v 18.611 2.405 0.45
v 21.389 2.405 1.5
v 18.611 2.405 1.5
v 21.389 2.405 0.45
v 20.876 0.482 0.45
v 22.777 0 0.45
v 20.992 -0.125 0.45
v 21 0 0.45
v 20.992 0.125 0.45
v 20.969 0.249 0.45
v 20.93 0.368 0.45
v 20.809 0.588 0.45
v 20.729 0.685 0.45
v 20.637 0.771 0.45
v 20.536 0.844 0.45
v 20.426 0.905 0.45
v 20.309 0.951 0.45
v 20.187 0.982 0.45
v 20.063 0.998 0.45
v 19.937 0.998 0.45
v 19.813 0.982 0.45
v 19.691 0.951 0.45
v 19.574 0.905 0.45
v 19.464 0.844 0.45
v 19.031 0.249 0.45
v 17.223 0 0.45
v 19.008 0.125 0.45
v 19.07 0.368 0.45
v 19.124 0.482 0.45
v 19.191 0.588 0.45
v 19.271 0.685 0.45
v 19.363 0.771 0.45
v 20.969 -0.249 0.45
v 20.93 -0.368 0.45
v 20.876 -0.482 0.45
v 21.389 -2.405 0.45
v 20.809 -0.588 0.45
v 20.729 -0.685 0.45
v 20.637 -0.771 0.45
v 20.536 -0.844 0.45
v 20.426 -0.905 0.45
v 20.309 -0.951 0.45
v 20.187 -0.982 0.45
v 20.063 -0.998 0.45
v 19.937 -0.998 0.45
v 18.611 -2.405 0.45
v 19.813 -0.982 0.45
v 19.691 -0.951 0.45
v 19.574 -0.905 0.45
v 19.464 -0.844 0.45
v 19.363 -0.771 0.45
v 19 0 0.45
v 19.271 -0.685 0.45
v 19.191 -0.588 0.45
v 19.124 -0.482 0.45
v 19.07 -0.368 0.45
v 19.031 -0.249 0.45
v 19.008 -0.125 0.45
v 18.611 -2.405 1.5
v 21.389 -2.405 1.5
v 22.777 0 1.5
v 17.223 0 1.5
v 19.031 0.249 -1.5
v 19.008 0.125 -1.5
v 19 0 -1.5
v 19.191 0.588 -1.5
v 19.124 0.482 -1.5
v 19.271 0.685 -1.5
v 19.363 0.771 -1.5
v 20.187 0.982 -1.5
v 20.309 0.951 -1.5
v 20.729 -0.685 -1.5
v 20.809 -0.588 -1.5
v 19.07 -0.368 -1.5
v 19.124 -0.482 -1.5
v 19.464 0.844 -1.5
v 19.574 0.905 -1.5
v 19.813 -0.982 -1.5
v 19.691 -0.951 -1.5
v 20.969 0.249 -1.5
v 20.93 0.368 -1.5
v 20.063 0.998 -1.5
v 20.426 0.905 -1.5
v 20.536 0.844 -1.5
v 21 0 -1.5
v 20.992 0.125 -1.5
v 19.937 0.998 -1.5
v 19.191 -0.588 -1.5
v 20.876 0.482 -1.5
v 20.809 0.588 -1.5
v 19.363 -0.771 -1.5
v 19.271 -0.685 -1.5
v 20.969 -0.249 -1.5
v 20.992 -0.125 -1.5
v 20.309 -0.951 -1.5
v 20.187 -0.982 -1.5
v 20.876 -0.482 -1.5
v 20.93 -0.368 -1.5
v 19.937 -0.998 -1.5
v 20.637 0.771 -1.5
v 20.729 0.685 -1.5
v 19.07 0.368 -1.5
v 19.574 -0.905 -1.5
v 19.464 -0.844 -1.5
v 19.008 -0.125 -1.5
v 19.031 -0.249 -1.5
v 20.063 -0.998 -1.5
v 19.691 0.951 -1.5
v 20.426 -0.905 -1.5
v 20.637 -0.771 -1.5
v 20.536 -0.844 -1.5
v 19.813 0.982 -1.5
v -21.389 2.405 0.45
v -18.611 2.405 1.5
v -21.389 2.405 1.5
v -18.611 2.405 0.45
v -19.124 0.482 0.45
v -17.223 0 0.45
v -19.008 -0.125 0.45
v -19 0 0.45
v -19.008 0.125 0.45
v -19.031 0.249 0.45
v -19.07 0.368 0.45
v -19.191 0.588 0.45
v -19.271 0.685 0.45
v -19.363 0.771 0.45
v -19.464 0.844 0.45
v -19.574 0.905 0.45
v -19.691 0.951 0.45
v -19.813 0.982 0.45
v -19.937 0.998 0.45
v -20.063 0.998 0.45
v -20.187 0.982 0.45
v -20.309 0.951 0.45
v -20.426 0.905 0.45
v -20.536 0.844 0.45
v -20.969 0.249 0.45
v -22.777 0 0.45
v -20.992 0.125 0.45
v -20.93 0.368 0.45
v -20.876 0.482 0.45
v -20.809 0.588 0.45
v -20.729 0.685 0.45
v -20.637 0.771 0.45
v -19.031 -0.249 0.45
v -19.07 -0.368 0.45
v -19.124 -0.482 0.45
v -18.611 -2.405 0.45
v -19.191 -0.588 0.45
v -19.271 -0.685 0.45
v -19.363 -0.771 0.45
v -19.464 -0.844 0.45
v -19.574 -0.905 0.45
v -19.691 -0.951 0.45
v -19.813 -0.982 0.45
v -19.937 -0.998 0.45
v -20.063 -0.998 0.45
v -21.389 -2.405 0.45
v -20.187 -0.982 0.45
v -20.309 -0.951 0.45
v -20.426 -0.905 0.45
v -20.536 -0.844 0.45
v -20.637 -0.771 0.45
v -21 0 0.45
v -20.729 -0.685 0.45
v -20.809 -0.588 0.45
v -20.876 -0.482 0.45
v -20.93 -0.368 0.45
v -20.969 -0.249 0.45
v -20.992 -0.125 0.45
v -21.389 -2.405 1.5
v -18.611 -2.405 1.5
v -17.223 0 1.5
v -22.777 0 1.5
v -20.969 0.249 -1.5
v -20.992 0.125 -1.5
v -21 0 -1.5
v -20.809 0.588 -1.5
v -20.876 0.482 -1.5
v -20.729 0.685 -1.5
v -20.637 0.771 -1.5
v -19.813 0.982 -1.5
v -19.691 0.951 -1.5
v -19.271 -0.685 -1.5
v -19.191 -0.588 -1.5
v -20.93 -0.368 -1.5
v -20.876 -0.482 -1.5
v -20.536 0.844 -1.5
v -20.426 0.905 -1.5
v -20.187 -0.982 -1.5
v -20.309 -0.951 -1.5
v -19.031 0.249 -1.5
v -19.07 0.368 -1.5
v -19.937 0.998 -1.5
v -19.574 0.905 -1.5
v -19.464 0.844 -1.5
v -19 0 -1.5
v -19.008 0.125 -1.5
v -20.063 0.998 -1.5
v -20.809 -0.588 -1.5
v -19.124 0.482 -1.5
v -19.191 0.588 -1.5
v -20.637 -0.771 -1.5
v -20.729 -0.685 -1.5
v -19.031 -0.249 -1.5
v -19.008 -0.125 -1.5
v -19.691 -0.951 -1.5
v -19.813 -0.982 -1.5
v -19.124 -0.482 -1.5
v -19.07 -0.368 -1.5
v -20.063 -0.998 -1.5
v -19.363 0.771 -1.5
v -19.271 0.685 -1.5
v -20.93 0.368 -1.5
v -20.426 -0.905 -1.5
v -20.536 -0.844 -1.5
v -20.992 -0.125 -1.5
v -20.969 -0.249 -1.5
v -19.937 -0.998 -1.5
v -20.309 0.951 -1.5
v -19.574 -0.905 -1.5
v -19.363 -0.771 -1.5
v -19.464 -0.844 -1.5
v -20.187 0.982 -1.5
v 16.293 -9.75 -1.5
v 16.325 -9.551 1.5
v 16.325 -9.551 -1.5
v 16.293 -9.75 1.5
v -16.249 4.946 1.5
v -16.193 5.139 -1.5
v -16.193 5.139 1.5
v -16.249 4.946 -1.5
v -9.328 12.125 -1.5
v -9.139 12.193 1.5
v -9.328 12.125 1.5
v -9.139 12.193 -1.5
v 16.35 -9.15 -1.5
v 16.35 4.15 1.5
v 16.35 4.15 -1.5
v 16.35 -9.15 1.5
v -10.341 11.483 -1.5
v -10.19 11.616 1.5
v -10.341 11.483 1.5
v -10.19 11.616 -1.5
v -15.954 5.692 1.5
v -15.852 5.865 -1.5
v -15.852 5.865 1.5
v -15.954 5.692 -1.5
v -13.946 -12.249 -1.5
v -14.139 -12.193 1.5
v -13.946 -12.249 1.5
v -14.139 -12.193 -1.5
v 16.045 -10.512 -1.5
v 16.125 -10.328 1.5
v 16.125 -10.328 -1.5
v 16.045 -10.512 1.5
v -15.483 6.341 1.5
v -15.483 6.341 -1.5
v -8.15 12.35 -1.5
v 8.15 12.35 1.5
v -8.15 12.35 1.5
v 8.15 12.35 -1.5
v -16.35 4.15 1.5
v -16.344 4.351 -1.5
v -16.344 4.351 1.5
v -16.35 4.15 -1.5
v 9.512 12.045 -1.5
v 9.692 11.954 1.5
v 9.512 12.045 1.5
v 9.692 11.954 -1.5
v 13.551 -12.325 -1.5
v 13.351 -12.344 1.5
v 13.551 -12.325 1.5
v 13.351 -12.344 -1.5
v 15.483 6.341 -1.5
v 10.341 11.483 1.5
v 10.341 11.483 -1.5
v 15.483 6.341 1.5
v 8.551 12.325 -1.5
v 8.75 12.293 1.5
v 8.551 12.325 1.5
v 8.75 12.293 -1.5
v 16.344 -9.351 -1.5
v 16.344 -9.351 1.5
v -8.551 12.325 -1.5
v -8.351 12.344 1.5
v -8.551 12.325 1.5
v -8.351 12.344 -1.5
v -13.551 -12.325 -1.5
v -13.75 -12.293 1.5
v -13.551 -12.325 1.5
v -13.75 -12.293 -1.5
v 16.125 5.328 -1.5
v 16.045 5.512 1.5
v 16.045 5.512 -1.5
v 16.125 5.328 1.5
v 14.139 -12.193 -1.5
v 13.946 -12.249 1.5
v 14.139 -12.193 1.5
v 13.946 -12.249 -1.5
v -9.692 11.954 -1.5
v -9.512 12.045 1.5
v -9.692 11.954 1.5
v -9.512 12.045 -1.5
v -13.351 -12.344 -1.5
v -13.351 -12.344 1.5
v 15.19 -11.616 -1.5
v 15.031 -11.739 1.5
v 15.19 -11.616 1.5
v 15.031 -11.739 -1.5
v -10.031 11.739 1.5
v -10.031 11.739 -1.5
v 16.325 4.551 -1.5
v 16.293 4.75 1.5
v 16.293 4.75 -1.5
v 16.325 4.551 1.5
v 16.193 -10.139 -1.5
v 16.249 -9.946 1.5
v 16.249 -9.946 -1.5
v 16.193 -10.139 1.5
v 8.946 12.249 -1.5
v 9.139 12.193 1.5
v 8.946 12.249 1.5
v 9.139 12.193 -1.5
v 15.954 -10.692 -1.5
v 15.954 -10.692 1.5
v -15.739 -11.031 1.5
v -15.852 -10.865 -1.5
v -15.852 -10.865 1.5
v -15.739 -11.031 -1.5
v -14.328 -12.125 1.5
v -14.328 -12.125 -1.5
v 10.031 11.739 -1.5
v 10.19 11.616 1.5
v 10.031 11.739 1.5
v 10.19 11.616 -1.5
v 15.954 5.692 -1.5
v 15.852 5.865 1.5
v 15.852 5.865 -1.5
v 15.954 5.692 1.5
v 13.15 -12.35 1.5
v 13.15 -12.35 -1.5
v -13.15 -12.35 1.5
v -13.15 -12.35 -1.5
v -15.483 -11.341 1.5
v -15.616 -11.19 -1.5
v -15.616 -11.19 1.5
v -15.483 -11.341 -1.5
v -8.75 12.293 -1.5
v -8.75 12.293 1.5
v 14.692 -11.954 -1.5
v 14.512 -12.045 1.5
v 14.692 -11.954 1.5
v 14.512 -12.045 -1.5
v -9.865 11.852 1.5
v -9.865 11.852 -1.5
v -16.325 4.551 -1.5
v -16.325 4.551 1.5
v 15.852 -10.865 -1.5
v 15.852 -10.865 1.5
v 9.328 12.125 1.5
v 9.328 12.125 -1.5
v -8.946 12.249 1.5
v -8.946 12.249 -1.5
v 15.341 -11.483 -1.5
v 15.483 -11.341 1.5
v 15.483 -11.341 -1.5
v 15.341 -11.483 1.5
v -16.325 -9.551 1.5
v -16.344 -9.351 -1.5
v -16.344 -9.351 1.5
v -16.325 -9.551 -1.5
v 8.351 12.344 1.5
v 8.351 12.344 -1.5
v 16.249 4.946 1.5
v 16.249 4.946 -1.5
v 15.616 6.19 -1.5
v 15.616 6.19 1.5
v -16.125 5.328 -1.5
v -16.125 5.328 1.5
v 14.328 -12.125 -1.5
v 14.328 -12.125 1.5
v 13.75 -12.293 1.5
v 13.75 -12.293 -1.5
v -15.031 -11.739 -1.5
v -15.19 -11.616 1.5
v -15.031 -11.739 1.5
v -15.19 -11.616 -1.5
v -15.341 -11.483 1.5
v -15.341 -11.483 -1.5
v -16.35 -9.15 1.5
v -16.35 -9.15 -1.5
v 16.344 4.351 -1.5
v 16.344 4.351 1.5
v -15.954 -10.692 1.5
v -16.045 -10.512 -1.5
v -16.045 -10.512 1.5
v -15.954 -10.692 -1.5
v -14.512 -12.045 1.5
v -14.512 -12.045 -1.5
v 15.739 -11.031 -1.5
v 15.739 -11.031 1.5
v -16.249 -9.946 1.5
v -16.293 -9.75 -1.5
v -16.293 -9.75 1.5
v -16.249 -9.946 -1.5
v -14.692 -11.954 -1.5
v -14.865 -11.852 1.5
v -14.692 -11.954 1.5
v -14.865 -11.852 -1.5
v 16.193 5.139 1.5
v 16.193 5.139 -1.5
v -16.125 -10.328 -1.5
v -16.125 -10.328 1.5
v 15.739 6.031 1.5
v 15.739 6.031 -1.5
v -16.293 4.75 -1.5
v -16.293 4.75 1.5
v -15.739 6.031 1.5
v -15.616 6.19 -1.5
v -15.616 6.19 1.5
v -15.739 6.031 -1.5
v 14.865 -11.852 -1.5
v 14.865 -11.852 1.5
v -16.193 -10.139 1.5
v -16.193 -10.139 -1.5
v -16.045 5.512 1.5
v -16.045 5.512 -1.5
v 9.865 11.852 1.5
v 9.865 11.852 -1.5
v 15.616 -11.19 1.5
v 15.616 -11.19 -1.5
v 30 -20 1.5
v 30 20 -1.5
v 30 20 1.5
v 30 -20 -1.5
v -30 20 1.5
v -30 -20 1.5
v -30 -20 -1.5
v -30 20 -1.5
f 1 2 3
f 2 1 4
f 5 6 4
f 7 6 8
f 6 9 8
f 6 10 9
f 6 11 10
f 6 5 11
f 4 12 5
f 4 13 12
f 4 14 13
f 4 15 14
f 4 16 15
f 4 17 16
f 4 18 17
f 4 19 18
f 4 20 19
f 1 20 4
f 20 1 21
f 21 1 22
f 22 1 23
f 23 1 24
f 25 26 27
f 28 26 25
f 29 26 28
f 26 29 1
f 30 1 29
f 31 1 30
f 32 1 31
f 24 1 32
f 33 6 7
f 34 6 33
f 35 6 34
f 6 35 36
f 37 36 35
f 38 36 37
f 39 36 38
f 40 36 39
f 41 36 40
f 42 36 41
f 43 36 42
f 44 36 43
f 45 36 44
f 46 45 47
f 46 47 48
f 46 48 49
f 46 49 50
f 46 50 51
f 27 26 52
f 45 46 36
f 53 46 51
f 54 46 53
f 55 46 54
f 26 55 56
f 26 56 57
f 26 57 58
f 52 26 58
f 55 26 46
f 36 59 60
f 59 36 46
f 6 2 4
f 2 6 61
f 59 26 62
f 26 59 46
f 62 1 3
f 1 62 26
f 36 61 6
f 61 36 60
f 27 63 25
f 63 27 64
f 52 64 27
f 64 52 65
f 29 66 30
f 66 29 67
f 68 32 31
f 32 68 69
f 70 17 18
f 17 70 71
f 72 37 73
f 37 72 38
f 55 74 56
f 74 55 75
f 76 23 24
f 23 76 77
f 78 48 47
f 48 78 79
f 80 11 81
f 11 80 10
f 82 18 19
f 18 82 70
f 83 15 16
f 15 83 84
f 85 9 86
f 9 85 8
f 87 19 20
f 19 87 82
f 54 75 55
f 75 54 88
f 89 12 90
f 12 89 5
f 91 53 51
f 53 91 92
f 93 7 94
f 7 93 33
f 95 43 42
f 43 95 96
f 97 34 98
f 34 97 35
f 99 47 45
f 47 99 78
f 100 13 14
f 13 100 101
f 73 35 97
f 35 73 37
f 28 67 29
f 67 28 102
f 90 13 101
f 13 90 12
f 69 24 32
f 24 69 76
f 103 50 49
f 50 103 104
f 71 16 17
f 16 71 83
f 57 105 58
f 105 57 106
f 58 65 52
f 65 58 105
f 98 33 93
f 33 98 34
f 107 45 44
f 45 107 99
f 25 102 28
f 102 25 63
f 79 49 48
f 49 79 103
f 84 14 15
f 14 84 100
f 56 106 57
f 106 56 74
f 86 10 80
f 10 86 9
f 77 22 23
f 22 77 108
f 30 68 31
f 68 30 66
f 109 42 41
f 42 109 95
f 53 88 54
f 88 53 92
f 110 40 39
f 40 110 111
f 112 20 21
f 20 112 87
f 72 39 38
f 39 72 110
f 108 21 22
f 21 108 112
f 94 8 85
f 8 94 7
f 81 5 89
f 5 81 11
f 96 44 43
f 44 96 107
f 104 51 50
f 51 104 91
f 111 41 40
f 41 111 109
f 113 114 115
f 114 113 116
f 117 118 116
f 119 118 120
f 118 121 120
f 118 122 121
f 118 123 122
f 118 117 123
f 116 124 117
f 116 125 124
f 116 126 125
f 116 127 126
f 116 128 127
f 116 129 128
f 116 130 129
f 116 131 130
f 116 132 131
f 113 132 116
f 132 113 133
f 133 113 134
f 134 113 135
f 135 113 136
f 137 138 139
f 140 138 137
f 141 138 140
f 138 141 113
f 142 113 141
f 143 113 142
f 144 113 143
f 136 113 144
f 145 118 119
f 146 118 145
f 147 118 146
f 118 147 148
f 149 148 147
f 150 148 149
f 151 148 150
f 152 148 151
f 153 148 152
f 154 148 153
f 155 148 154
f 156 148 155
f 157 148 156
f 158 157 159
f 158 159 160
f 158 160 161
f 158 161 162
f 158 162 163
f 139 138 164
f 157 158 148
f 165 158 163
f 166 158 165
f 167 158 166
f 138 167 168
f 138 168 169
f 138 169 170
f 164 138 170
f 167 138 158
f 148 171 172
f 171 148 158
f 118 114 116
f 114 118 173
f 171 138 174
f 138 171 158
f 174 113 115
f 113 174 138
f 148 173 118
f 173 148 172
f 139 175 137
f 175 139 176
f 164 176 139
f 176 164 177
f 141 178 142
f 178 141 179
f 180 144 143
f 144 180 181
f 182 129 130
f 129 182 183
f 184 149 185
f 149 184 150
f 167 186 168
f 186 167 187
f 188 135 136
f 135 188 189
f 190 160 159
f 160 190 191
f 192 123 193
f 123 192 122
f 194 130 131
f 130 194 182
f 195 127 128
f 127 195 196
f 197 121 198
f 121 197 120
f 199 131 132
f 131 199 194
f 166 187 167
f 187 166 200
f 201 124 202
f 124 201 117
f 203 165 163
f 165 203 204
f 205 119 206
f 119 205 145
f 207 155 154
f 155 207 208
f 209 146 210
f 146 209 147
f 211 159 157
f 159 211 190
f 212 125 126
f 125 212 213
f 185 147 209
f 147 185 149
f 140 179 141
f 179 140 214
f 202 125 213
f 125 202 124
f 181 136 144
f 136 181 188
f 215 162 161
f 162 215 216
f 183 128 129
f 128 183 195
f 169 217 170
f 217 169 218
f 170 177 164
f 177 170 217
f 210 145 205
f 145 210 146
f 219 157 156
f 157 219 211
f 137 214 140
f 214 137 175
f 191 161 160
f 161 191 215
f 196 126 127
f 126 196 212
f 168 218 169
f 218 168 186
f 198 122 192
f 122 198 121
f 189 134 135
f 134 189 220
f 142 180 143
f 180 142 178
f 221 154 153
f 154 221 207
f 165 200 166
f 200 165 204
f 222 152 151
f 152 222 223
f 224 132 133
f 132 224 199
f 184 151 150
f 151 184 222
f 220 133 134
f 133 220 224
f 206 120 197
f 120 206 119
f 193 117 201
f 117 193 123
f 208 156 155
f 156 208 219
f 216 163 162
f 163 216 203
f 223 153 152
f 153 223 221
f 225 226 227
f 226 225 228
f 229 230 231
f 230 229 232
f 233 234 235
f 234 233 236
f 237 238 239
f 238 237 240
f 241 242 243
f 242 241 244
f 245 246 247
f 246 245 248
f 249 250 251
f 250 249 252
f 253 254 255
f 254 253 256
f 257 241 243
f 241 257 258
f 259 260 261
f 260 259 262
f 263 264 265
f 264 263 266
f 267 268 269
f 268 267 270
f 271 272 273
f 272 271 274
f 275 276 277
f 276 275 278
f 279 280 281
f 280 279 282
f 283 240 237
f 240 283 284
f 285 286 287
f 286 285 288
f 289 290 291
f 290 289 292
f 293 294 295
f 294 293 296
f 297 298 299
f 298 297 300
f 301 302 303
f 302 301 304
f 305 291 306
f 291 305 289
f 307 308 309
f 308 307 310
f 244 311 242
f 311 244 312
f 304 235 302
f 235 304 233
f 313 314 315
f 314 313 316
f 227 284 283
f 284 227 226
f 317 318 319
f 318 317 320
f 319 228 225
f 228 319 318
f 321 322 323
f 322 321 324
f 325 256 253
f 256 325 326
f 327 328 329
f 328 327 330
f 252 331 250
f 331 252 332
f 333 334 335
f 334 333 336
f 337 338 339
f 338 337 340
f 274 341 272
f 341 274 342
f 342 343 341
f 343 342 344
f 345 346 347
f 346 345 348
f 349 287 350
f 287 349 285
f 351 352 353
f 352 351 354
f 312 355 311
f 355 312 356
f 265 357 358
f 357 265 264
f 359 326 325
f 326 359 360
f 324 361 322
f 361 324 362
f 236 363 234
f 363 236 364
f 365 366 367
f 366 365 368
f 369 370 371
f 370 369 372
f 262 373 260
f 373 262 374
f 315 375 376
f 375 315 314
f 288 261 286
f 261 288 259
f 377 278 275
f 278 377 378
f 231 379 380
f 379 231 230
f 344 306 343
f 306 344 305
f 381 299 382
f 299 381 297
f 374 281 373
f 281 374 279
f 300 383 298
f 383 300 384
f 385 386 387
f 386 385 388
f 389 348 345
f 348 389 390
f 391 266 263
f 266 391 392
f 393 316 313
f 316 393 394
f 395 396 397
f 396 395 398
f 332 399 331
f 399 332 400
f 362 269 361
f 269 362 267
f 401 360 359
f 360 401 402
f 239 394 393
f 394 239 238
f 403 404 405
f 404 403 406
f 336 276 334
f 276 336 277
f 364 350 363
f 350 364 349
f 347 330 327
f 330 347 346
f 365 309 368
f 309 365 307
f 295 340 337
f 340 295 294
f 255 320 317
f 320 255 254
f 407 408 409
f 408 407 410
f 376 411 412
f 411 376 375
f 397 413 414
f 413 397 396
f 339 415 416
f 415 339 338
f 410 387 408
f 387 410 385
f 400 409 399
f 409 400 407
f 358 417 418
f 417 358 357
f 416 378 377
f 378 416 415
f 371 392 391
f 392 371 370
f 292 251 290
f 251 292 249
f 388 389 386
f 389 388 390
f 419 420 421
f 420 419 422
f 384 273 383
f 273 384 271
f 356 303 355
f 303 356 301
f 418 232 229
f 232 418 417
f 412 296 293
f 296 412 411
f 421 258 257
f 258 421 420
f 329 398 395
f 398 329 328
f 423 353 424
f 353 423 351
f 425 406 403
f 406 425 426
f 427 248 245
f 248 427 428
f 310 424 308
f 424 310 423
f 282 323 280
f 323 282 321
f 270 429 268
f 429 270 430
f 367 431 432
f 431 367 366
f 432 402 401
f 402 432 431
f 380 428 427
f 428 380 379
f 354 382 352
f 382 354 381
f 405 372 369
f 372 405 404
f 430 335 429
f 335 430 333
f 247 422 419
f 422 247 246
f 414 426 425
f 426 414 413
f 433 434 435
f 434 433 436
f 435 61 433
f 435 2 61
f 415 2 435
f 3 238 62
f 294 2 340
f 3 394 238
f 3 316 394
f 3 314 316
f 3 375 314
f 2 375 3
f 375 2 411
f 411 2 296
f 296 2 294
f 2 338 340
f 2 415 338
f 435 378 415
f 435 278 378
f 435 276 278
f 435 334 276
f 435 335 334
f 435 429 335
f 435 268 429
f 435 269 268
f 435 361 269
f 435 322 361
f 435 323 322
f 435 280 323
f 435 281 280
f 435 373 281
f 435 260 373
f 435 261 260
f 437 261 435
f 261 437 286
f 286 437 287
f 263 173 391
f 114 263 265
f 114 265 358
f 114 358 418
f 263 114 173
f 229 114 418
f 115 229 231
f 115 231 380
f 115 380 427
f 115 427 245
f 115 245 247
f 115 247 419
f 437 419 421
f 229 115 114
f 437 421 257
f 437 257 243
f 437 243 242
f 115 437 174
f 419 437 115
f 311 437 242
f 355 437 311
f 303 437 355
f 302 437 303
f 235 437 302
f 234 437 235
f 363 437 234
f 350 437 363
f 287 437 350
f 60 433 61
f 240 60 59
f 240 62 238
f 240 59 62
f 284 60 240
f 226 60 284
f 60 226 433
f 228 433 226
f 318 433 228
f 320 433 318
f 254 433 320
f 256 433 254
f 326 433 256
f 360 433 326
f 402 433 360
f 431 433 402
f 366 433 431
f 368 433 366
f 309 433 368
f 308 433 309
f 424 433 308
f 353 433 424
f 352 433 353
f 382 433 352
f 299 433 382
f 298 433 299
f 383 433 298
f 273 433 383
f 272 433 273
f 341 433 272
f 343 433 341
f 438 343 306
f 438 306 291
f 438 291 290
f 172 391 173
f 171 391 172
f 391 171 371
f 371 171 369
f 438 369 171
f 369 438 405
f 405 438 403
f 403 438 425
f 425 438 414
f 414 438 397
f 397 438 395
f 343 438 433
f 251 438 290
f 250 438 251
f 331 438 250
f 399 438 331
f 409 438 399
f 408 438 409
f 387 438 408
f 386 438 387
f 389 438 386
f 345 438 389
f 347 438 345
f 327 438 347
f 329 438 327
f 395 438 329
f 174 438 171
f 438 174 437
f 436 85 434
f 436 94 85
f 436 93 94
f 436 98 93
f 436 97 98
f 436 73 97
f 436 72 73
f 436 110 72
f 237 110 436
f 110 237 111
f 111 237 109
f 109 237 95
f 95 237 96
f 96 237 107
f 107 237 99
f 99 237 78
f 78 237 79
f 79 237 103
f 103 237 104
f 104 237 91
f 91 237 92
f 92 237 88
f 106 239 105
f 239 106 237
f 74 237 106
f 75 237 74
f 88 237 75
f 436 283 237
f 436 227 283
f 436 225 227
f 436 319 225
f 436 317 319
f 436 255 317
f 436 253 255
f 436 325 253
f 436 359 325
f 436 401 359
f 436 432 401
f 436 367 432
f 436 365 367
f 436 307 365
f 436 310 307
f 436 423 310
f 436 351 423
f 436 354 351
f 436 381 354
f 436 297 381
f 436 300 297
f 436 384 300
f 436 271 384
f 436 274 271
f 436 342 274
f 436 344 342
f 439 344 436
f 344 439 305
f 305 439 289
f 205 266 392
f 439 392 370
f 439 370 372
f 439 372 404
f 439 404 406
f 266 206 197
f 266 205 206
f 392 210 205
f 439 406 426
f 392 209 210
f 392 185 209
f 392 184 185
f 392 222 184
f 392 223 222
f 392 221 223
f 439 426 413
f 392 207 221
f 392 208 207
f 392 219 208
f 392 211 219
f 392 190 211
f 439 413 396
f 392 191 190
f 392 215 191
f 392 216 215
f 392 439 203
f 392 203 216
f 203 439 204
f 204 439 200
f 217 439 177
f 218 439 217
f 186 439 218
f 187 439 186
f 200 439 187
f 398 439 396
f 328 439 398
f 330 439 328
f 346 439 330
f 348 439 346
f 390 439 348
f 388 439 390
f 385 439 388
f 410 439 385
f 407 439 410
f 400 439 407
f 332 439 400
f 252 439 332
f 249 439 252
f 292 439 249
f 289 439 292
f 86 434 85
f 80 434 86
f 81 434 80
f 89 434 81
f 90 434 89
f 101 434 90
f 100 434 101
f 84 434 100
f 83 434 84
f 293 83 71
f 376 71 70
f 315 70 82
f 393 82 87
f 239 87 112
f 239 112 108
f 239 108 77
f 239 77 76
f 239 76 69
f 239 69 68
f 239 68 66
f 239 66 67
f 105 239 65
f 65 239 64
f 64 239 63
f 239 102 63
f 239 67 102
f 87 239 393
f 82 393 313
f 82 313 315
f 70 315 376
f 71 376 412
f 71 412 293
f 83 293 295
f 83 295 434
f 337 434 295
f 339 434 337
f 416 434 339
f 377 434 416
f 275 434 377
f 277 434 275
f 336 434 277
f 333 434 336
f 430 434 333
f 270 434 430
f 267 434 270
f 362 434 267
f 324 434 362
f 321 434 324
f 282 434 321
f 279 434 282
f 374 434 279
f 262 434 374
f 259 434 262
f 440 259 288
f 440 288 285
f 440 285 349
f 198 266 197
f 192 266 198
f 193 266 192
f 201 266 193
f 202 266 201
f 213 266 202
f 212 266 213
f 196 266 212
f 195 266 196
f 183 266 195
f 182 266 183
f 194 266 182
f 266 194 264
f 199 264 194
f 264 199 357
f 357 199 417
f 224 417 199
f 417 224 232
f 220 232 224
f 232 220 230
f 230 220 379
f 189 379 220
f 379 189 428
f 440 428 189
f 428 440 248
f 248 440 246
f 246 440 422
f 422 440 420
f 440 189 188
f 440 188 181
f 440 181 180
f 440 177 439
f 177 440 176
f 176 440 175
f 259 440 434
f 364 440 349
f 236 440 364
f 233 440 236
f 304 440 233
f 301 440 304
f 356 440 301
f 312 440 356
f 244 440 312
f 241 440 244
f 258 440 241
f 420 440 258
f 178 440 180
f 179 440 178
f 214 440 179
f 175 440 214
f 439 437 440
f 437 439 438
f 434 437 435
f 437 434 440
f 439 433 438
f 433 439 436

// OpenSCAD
// file: ../../lib/material.scad
module gray() {
	color([.4, .4, .4]) children([0:$children-1]);
}

module black() {
	color([.3, .3, .3]) children([0:$children-1]);
}

module orange() {
	color([1, .7, 0]) children([0:$children-1]);
}

module yellow() {
	color([.7, .7, .3]) children([0:$children-1]);
}

module green_pcb() {
	color([.0, .5, .25]) children([0:$children-1]);
}

module metal() {
	color([.7, .7, .7]) children([0:$children-1]);
}

module gold() {
	color([.8, .5, .0]) children([0:$children-1]);
}

module stainless(no="1.4301") {
	color([0.45, 0.43, 0.5]) children([0:$children-1]);
}

module steel(no) {
	color([0.65, 0.67, 0.72]) children([0:$children-1]);
}

module iron(no="ST37") {
	color([0.36, 0.33, 0.33]) children([0:$children-1]);
}

module plastic() {
	color([1, .7, 0]) children([0:$children-1]);
}
// file: ../../lib/bolt/metric_bolt.scad
include <bolt.scad>;

// https://www.fairburyfastener.com/xdims_metric_nuts.htm

//  hex_nut (height, thread_d, size, tolerance, quality, thread, pitch);
//hex_nut (1/8, 1/4, 3/8, 1/128, 32, 1, "imperial", 28);

/*
    hex_nut (height, thread_d, size, tolerance, quality, bool_cut, thread, pitch);
        height      =   height of the nut
        thread_d    =   threaded hole diameter width
        size        =   [ 0.00, 0.00, 0.00 ]hexagonal nut size
        tolerance   =   tolerance of entire measures (always positive, addition and subtraction already
                        calculated within the script
        quality     =   overall quality of the returned function (ref. $fn)
        bool_cut    =   do (1) or not (0) the nut cut
        *thread     =   string variable declaring measure type -> "metric" or "imperial"
        *pitch      =   stands for thread pitch      
*/

module m2_hex_nut() {
  hex_nut(1.6, 2, 4.32, 0.01, 32, 1, "metric", 0.4);
}

module m2_5_hex_nut() {
  hex_nut(2, 2.5, 5.45, 0.01, 32, 1, "metric", 0.45);
}

module m3_hex_nut() {
  hex_nut(2.3, 3, 6.01, 0.01, 32, 1, "metric", 0.5);
}

module m4_hex_nut() {
  hex_nut(3.2, 4, 7.66, 0.01, 32, 1, "metric", 0.7);
}

module m5_hex_nut() {
  hex_nut(4.7, 5, 8.79, 0.01, 32, 1, "metric", 0.8);
}

module m6_hex_nut() {
  hex_nut(5.2, 6, 11.05, 0.01, 32, 1, "metric", 1);
}

module m8_hex_nut() {
  hex_nut(6.8, 8, 14.38, 0.01, 32, 1, "metric", 1.25);
}

module m10_hex_nut() {
  hex_nut(8.4, 10, 17.77, 0.01, 32, 1, "metric", 1.5);
}

//  hex_bolt (lenght, thread_d, head_h, head_d, tolerance, quality, thread, pitch);

/*
    hex_bolt (lenght, thread_d, head_h, head_d, tolerance, quality, bool_cut, thread, pitch);
        lenght      =   threaded bar lenght
        thread_d    =   threaded bar diameter width
        head_h      =   hexagonal bolt head height
        head_d      =   hexagonal bolt head size
        tolerance   =   tolerance of entire measures (always positive, addition and subtraction already
                        calculated within the script
        quality     =   overall quality of the returned function (ref. $fn)
        bool_cut    =   do (1) or not (0) the nut cut
        *thread     =   string variable declaring measure type -> "metric" or "imperial"
        *pitch      =   stands for thread pitch
*/

module m2_hex_bolt(lenght=26,head_h=2) {
  translate([0, 0, -lenght])
    hex_bolt(lenght, 2, head_h, 4.32, 0.1, 32, 1, "metric", 0.4);
}

module m2_5_hex_bolt(lenght=26,head_h=2) {
  translate([0, 0, -lenght])
    hex_bolt(lenght, 2.5, head_h, 5.45, 0.1, 32, 1, "metric", 0.45);
}

module m3_hex_bolt(lenght=26,head_h=2) {
  translate([0, 0, -lenght])
    hex_bolt(lenght, 3, head_h, 6.01, 0.1, 32, 1, "metric", 0.5);
}

module m4_hex_bolt(lenght=26,head_h=2) {
  translate([0, 0, -lenght])
    hex_bolt(lenght, 4, head_h, 7.66, 0.1, 32, 1, "metric", 0.7);
}

module m5_hex_bolt(lenght=26,head_h=2) {
  translate([0, 0, -lenght])
    hex_bolt(lenght, 5, head_h, 8.79, 0.1, 32, 1, "metric", 0.8);
}

module m6_hex_bolt(lenght=26,head_h=2) {
  translate([0, 0, -lenght])
    hex_bolt(lenght, 6, head_h, 11.05, 0.1, 32, 1, "metric", 1);
}

module m8_hex_bolt(lenght=26,head_h=6.8) {
  translate([0, 0, -lenght])
    hex_bolt(lenght, 8, head_h, 14.38, 0.1, 32, 1, "metric", 1.25);
}

module m10_hex_bolt(lenght=26,head_h=8.4) {
  translate([0, 0, -lenght])
    hex_bolt(lenght, 10, head_h, 17.77, 0.1, 32, 1, "metric", 1.5);
}

//m8_hex_bolt_extrude(20, 1, 0.1);

module m1_6_hex_bolt_extrude(depth, head, clear) {
  translate([0,0,-depth/2]) hex_bolt_extrude(depth, head, 1.6, 3.41, clear);
}

module m2_hex_bolt_extrude(depth, head, clear) {
  translate([0,0,-depth/2]) hex_bolt_extrude(depth, head, 2, 4.32, clear);
}

module m2_5_hex_bolt_extrude(depth, head, clear) {
  translate([0,0,-depth/2]) hex_bolt_extrude(depth, head, 2.5, 5.45, clear);
}

module m3_hex_bolt_extrude(depth, head, clear) {
  translate([0,0,-depth/2]) hex_bolt_extrude(depth, head, 3, 6.01, clear);
}

module m4_hex_bolt_extrude(depth, head, clear) {
  translate([0,0,-depth/2]) hex_bolt_extrude(depth, head, 4, 7.66, clear);
}

module m5_hex_bolt_extrude(depth, head, clear) {
  translate([0,0,-depth/2]) hex_bolt_extrude(depth, head, 5, 8.79, clear);
}

module m6_hex_bolt_extrude(depth, head, clear) {
  translate([0,0,-depth/2]) hex_bolt_extrude(depth, head, 6, 11.05, clear);
}

module m8_hex_bolt_extrude(depth, head, clear) {
  translate([0,0,-depth/2]) hex_bolt_extrude(depth, head, 8, 14.38, clear);
}

module m10_hex_bolt_extrude(depth, head, clear) {
  translate([0,0,-depth/2]) hex_bolt_extrude(depth, head, 10, 17.77, clear);
}

module hex_bolt_extrude(depth, head_h, body, head, clear) {
  translate([0,0,head_h/2]) rotate([0, 0, 90]) hex_head_extrude(head_h, head, clear);
  translate([0,0,head_h]) bolt_body_extrude(depth-head_h+clear, body, clear);
}

module bolt_body_extrude(height, diameter, clear) {
    radius = diameter/2+clear*2;
    cylinder(h=height, r1=radius, r2=radius, center=false, $fn=50);
}

module hex_head_extrude(height, diameter, clear) {
    height = height+clear;
	radius = diameter+1+clear*4;
    angle = 360/6;
	cote = (radius)/tan(angle);

	union() {
		rotate([0,0,0])
			cube([radius,cote,height],center=true);
		rotate([0,0,angle])
			cube([radius,cote,height],center=true);
		rotate([0,0,2*angle])
			cube([radius,cote,height],center=true);
	}
}
// file: ../../lib/plate.scad
include <./material.scad>;

module plate(height=50, width=50, depth=10) {
  plastic() {
    cube([height, width, depth], true);
  }
}
// file: ../../lib/connector/connector_euro.scad
include <../bolt/metric_bolt.scad>;

sides = 100;

//connector_GSD4_extrusion(3,0.1);
//connector_Schurter_6100_4_extrusion(3,0.1);

module connector_Schurter_6100_4_extrusion(depth,clear)
{
    conn_height = 20;
    conn_width = 27.5;
    conn_radius = 3;
    conn_corner = 4.5;
    lock_width = 12;
    lock_height = conn_height+8;
    lock_depth = 1;

    connector_euro(conn_height,conn_width,depth,conn_radius,conn_corner,clear);

    if (type != "simple") {
        translate([0, 0, lock_depth-depth/2])
            connector_euro_lock(lock_width,lock_height,depth-lock_depth,clear);
    }
}

module connector_GSD4_extrusion(depth,clear)
{
    conn_height = 24.5;
    conn_width = 32.5;
    conn_radius = 3;
    conn_corner = 5;
    hole_width = 40;
    hole_diameter = 3.0+clear;
    conn_hole_distance = (hole_width-conn_width)/2;

    connector_euro_extrusion(conn_height,conn_width,depth,conn_radius,conn_corner,clear);

    translate([-conn_width/2-conn_hole_distance,0,0])
        m1_6_hex_bolt_extrude(depth, 1, clear);
    translate([conn_width/2+conn_hole_distance,0,0])
        m1_6_hex_bolt_extrude(depth, 1, clear);
}

module connector_euro_lock(width,height,depth,clear)
{
    height = height+2*clear;
    width = width+2*clear;
    depth = depth+clear;

    cube([width, height, depth],center=true);
}

module connector_euro_extrusion(height,width,depth,radius,corner,clear)
{
    height = height+2*clear;
    width = width+2*clear;
    radius = radius+2*clear;
    depth = depth+clear;
    height_axis = height/2;
    width_axis = width/2;

    hull(){
        translate([radius-width_axis, radius-height_axis, 0])
            cylinder(r=radius, h=depth,center=true, $fn=sides);
        translate([width_axis-radius, radius-height_axis, 0])
            cylinder(r=radius, h=depth,center=true, $fn=sides);
        translate([radius-width_axis, height_axis-radius-corner, 0])
            cylinder(r=radius, h=depth,center=true, $fn=sides);
        translate([radius+corner-width_axis, height_axis-radius, 0])
            cylinder(r=radius, h=depth,center=true, $fn=sides);
        translate([width_axis-radius, height_axis-radius-corner, 0])
            cylinder(r=radius, h=depth,center=true, $fn=sides);
        translate([width_axis-radius-corner, height_axis-radius, 0])
            cylinder(r=radius, h=depth,center=true, $fn=sides);
    }
}
// main file
include <../../lib/connector/connector_euro.scad>;
include <../../lib/plate.scad>;

difference() {
    plate(60,40,3);
    rotate([0,180,0]) {
        connector_GSD4_extrusion(3,0.1);
    }
}
